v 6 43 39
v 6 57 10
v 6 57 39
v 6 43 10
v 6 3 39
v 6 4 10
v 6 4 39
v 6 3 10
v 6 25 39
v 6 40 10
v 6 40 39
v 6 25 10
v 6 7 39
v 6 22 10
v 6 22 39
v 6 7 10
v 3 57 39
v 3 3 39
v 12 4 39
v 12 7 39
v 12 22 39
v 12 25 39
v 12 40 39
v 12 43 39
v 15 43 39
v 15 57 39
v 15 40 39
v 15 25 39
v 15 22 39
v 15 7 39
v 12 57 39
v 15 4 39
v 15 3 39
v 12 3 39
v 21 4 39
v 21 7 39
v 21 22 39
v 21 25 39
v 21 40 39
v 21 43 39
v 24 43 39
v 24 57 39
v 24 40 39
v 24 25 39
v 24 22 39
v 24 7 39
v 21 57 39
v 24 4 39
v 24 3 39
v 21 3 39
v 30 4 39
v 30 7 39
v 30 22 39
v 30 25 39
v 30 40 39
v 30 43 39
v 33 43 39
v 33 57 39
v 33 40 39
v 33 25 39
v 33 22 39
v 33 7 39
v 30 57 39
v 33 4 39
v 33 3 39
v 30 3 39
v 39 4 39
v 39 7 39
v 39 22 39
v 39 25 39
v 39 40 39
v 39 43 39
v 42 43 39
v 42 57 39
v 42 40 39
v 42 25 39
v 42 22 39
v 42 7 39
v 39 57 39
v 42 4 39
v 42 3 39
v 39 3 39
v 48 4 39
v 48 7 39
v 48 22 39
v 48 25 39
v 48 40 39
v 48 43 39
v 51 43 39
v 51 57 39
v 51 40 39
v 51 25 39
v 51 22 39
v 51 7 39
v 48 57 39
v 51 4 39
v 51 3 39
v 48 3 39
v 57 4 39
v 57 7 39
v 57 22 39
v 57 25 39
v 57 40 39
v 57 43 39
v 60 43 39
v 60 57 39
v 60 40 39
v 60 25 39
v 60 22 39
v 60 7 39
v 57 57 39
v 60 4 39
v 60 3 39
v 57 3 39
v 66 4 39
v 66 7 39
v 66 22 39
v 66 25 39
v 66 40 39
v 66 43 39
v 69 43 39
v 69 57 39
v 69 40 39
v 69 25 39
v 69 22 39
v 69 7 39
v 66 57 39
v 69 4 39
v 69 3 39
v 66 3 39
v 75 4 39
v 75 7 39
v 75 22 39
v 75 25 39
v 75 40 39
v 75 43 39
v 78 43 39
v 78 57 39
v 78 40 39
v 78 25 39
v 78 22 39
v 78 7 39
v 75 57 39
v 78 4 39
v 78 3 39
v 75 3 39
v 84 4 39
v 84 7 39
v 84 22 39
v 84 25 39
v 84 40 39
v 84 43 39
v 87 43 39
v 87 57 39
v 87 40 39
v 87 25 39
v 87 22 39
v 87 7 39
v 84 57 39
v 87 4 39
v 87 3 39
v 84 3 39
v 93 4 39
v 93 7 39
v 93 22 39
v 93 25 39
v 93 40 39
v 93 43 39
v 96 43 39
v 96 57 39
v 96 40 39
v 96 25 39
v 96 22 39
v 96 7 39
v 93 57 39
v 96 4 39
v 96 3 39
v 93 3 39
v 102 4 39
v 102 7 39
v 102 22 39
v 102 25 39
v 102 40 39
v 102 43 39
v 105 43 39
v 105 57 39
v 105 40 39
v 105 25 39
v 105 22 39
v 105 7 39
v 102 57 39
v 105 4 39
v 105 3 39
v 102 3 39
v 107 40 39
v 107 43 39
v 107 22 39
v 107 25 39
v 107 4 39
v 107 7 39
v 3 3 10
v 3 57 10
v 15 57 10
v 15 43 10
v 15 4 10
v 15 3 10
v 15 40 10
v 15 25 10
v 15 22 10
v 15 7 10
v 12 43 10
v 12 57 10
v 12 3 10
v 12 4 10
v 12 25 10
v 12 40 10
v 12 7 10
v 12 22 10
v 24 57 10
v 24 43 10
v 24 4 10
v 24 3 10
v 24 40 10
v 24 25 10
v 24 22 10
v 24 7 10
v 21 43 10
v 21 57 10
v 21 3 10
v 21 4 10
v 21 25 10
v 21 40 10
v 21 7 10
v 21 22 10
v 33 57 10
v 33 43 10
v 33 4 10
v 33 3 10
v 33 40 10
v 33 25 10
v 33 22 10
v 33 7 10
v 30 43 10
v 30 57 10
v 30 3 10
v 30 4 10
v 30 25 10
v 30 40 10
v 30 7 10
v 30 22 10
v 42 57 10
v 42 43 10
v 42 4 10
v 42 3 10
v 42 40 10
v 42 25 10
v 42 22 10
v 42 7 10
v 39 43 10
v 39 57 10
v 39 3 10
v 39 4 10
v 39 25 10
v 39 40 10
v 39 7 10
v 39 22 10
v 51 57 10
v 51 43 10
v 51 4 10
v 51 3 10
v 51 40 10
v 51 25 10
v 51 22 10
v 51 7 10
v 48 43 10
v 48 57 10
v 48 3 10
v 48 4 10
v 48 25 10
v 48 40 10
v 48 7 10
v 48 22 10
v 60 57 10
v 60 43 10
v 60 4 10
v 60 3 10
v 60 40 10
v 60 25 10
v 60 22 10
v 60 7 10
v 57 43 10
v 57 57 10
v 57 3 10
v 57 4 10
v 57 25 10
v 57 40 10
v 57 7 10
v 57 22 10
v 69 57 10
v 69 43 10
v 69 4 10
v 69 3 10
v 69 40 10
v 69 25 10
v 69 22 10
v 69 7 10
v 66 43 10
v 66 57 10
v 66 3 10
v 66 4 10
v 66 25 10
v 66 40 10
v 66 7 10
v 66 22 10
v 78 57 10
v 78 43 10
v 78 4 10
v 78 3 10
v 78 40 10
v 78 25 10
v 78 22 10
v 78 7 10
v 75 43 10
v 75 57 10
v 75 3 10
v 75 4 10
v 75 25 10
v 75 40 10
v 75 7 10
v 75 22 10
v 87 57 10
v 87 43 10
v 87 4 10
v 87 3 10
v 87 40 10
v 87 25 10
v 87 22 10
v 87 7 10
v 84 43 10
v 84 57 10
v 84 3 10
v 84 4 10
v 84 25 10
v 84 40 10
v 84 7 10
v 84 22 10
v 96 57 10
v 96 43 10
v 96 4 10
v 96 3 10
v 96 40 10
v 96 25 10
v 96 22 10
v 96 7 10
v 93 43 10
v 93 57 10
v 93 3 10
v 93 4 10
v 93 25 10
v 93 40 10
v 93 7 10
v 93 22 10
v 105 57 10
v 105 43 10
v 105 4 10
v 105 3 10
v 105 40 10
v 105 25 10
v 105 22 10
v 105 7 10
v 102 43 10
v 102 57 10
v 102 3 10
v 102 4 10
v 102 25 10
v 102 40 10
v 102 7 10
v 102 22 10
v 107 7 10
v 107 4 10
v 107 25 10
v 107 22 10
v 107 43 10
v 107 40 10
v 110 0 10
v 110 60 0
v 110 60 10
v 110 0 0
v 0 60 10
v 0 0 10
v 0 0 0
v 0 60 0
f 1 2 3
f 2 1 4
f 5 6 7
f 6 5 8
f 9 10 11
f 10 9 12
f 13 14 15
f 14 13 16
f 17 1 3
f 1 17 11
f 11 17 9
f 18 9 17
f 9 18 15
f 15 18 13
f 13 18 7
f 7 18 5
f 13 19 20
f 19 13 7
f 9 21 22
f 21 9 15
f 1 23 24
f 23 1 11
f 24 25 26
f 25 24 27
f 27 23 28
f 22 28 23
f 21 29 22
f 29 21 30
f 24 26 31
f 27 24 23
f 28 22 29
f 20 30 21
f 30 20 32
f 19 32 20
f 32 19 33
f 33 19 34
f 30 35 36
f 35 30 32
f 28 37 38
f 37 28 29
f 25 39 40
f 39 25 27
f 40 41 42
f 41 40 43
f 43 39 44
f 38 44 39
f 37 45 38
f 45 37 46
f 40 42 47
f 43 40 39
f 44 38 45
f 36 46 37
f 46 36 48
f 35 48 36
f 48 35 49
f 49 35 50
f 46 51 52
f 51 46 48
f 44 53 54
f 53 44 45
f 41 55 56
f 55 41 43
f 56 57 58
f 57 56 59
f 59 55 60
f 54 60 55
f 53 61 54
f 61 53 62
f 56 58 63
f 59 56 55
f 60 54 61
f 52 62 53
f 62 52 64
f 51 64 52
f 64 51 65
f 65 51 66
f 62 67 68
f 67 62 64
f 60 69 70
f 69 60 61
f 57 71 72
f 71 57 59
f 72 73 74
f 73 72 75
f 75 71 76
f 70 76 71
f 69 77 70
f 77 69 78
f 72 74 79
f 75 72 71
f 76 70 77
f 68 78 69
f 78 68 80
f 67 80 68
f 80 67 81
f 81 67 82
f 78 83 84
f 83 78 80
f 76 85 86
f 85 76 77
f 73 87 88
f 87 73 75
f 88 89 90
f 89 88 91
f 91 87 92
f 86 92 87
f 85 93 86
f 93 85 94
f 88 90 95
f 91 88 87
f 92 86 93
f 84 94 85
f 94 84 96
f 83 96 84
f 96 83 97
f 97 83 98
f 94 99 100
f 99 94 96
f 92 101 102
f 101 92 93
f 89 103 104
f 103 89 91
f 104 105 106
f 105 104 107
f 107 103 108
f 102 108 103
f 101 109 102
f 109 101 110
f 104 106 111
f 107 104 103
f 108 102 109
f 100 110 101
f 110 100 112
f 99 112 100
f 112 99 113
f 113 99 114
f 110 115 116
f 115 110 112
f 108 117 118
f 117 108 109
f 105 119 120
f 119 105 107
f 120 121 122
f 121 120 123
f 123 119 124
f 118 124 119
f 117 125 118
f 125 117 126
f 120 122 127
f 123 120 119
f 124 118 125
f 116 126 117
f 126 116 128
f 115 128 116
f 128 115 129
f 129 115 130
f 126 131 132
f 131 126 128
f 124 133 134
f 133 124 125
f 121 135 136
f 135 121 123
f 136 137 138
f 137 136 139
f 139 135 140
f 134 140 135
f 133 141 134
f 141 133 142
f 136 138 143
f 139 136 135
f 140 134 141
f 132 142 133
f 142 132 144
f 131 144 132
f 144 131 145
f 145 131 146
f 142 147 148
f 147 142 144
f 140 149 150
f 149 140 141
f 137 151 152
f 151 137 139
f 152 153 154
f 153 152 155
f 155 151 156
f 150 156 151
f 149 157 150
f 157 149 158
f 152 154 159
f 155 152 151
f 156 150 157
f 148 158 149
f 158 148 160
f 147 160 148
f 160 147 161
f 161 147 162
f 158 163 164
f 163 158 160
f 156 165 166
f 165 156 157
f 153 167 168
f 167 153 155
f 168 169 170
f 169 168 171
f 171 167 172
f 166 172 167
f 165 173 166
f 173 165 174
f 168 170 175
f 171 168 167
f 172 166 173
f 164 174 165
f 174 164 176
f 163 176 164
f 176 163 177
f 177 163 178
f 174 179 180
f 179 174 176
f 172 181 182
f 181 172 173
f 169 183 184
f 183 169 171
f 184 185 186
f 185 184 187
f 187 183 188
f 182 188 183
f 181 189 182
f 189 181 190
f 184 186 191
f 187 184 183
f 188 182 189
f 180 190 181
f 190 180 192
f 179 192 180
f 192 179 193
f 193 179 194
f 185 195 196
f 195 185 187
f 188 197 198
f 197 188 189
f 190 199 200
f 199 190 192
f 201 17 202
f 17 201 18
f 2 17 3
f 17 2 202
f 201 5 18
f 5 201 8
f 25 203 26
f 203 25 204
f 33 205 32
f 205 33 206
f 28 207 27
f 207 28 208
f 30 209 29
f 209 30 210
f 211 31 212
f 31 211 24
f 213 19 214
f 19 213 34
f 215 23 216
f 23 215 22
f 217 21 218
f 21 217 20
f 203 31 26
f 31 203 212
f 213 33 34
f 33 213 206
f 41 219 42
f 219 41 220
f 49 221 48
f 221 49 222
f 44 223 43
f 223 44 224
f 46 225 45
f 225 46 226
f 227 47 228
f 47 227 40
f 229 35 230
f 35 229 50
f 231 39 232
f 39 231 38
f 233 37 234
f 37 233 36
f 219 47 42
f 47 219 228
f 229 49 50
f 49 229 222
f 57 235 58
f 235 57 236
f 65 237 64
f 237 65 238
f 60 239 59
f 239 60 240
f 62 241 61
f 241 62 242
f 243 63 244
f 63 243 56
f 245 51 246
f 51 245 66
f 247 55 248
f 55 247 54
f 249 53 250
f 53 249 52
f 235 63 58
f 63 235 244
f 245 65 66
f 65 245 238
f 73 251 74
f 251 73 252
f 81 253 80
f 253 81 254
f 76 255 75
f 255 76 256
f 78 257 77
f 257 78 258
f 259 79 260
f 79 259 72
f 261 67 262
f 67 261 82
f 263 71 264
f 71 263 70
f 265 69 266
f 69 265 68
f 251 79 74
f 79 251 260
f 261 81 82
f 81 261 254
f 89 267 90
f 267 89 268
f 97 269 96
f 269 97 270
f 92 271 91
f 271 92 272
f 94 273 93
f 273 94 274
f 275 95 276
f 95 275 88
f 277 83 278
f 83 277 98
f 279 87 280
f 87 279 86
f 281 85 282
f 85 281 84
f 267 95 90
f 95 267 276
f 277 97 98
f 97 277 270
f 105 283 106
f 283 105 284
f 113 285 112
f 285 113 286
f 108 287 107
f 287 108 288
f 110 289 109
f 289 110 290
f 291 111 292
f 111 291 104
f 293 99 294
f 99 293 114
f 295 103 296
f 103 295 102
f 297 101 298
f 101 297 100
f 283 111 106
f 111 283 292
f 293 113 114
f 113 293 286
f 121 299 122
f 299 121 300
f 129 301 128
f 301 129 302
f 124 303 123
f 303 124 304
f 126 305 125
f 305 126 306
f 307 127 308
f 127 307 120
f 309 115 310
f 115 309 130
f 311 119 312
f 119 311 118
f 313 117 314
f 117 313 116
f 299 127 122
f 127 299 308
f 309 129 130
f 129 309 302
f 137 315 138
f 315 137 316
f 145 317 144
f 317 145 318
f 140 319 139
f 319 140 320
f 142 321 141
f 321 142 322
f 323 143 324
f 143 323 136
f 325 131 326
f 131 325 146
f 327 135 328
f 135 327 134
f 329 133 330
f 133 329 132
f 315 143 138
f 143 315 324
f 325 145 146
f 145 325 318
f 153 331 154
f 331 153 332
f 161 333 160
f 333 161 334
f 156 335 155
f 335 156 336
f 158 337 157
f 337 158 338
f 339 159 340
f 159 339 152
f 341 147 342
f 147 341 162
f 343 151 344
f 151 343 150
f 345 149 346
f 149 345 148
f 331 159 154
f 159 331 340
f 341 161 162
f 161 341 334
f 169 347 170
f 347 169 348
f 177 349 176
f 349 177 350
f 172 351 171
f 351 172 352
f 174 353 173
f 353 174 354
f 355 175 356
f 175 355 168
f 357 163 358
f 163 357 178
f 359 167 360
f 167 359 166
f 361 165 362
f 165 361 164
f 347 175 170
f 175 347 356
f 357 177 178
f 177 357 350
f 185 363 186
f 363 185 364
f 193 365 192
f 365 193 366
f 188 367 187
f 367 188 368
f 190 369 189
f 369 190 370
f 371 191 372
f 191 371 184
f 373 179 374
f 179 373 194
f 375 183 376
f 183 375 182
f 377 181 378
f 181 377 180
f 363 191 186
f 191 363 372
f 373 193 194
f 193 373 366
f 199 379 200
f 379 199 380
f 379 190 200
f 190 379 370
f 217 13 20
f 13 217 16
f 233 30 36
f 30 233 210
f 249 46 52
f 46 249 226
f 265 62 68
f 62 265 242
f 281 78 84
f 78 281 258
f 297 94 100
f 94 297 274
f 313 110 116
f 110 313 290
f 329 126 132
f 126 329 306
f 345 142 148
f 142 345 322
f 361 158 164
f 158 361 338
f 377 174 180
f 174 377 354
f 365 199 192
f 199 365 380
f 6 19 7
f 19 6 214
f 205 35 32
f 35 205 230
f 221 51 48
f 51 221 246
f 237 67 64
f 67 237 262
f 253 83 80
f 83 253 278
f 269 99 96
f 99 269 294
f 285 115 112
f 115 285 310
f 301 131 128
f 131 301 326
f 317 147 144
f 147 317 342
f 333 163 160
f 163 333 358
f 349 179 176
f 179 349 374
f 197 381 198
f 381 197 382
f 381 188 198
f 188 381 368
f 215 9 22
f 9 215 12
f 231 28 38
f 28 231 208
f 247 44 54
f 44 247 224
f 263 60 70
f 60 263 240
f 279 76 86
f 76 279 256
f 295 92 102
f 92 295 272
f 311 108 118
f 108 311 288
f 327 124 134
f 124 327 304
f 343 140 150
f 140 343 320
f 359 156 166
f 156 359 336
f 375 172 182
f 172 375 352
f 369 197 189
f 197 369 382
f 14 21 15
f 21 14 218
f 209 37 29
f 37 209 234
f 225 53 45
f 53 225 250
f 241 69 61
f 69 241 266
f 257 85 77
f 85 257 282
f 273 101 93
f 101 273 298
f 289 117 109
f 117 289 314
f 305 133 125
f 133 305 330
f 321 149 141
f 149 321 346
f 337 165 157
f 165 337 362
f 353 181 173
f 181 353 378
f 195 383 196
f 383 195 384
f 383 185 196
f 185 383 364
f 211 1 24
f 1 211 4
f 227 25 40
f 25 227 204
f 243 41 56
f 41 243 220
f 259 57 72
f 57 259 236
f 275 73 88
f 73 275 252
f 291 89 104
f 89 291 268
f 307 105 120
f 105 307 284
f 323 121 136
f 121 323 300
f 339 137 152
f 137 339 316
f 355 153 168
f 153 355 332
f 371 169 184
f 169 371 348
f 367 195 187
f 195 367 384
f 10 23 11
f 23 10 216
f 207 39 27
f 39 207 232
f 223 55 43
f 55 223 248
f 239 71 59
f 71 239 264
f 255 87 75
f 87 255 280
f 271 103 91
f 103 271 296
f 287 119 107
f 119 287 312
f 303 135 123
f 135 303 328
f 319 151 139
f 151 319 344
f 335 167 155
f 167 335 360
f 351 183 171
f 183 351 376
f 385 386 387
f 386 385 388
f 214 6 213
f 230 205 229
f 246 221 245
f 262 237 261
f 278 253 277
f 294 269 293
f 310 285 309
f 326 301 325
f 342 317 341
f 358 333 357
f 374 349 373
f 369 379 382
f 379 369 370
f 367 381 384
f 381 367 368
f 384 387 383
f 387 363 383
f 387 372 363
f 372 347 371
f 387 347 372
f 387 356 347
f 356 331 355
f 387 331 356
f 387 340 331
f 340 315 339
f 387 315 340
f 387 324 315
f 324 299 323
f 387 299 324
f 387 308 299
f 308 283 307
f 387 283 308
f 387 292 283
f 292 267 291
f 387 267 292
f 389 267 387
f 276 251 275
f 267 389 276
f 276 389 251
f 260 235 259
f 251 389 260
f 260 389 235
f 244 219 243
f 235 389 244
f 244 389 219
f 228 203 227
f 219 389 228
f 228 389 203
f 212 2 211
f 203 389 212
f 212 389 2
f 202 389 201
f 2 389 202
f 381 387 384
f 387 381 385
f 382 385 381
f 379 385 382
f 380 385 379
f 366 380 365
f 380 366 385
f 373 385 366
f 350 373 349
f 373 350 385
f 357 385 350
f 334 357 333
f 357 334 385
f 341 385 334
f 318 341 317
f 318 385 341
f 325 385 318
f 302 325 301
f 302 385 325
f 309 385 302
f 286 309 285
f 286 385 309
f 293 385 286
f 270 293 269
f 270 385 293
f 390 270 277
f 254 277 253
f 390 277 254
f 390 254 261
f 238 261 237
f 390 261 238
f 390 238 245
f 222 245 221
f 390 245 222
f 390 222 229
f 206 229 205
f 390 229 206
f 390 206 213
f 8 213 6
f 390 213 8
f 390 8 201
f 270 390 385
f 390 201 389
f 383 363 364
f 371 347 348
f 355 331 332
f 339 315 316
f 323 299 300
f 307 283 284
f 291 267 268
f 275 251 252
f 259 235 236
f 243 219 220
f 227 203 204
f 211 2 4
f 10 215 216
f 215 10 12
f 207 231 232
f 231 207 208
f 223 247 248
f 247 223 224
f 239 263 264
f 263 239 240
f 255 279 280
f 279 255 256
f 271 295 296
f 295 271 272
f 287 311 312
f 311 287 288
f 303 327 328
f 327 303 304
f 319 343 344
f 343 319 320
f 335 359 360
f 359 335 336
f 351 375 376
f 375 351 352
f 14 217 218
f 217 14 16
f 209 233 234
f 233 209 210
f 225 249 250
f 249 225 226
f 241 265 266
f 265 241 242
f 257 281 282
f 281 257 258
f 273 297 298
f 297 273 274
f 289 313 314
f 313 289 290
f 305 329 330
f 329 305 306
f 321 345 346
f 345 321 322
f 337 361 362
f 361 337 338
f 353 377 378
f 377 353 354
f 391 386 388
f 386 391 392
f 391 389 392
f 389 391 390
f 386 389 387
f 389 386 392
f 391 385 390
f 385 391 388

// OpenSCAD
$fn = 32;
// target_bbox: 110, 60, 39
// ----------------------------------------------------------------------
// Heatsink: cross fin block
// ----------------------------------------------------------------------

// --- parameters (mm) ---
base_l = 110;             // base length, X
base_w = 60;              // base width, Y
base_t = 10;              // base plate thickness
fin_h = 30;               // fin height above the base
fin_t = 3;                // fin thickness
edge = 3;                 // margin from the base ends
pitch = 9;                // fin pitch
rib_pitch = 18;           // cross rib pitch
fit_tol = 0.05;           // tolerance for press fits, mm
free_tol = 0.3;           // tolerance for clearance fits, mm

n_fins = floor((base_l - 2 * edge - fin_t) / pitch) + 1;  // fin count
total_h = base_t + fin_h - 1;  // overall height
n_ribs = floor((base_w - 2 * edge) / rib_pitch);  // rib count

union() {
  cube([base_l, base_w, base_t]);
  for (i = [0 : n_fins - 1])
    translate([edge + i * pitch, edge, base_t - 1])
      cube([fin_t, base_w - 2 * edge, fin_h]);
  for (i = [0 : n_ribs - 1])
    translate([edge, edge + 1 + i * rib_pitch, base_t - 1])
      cube([base_l - 2 * edge, fin_t, fin_h]);
}
